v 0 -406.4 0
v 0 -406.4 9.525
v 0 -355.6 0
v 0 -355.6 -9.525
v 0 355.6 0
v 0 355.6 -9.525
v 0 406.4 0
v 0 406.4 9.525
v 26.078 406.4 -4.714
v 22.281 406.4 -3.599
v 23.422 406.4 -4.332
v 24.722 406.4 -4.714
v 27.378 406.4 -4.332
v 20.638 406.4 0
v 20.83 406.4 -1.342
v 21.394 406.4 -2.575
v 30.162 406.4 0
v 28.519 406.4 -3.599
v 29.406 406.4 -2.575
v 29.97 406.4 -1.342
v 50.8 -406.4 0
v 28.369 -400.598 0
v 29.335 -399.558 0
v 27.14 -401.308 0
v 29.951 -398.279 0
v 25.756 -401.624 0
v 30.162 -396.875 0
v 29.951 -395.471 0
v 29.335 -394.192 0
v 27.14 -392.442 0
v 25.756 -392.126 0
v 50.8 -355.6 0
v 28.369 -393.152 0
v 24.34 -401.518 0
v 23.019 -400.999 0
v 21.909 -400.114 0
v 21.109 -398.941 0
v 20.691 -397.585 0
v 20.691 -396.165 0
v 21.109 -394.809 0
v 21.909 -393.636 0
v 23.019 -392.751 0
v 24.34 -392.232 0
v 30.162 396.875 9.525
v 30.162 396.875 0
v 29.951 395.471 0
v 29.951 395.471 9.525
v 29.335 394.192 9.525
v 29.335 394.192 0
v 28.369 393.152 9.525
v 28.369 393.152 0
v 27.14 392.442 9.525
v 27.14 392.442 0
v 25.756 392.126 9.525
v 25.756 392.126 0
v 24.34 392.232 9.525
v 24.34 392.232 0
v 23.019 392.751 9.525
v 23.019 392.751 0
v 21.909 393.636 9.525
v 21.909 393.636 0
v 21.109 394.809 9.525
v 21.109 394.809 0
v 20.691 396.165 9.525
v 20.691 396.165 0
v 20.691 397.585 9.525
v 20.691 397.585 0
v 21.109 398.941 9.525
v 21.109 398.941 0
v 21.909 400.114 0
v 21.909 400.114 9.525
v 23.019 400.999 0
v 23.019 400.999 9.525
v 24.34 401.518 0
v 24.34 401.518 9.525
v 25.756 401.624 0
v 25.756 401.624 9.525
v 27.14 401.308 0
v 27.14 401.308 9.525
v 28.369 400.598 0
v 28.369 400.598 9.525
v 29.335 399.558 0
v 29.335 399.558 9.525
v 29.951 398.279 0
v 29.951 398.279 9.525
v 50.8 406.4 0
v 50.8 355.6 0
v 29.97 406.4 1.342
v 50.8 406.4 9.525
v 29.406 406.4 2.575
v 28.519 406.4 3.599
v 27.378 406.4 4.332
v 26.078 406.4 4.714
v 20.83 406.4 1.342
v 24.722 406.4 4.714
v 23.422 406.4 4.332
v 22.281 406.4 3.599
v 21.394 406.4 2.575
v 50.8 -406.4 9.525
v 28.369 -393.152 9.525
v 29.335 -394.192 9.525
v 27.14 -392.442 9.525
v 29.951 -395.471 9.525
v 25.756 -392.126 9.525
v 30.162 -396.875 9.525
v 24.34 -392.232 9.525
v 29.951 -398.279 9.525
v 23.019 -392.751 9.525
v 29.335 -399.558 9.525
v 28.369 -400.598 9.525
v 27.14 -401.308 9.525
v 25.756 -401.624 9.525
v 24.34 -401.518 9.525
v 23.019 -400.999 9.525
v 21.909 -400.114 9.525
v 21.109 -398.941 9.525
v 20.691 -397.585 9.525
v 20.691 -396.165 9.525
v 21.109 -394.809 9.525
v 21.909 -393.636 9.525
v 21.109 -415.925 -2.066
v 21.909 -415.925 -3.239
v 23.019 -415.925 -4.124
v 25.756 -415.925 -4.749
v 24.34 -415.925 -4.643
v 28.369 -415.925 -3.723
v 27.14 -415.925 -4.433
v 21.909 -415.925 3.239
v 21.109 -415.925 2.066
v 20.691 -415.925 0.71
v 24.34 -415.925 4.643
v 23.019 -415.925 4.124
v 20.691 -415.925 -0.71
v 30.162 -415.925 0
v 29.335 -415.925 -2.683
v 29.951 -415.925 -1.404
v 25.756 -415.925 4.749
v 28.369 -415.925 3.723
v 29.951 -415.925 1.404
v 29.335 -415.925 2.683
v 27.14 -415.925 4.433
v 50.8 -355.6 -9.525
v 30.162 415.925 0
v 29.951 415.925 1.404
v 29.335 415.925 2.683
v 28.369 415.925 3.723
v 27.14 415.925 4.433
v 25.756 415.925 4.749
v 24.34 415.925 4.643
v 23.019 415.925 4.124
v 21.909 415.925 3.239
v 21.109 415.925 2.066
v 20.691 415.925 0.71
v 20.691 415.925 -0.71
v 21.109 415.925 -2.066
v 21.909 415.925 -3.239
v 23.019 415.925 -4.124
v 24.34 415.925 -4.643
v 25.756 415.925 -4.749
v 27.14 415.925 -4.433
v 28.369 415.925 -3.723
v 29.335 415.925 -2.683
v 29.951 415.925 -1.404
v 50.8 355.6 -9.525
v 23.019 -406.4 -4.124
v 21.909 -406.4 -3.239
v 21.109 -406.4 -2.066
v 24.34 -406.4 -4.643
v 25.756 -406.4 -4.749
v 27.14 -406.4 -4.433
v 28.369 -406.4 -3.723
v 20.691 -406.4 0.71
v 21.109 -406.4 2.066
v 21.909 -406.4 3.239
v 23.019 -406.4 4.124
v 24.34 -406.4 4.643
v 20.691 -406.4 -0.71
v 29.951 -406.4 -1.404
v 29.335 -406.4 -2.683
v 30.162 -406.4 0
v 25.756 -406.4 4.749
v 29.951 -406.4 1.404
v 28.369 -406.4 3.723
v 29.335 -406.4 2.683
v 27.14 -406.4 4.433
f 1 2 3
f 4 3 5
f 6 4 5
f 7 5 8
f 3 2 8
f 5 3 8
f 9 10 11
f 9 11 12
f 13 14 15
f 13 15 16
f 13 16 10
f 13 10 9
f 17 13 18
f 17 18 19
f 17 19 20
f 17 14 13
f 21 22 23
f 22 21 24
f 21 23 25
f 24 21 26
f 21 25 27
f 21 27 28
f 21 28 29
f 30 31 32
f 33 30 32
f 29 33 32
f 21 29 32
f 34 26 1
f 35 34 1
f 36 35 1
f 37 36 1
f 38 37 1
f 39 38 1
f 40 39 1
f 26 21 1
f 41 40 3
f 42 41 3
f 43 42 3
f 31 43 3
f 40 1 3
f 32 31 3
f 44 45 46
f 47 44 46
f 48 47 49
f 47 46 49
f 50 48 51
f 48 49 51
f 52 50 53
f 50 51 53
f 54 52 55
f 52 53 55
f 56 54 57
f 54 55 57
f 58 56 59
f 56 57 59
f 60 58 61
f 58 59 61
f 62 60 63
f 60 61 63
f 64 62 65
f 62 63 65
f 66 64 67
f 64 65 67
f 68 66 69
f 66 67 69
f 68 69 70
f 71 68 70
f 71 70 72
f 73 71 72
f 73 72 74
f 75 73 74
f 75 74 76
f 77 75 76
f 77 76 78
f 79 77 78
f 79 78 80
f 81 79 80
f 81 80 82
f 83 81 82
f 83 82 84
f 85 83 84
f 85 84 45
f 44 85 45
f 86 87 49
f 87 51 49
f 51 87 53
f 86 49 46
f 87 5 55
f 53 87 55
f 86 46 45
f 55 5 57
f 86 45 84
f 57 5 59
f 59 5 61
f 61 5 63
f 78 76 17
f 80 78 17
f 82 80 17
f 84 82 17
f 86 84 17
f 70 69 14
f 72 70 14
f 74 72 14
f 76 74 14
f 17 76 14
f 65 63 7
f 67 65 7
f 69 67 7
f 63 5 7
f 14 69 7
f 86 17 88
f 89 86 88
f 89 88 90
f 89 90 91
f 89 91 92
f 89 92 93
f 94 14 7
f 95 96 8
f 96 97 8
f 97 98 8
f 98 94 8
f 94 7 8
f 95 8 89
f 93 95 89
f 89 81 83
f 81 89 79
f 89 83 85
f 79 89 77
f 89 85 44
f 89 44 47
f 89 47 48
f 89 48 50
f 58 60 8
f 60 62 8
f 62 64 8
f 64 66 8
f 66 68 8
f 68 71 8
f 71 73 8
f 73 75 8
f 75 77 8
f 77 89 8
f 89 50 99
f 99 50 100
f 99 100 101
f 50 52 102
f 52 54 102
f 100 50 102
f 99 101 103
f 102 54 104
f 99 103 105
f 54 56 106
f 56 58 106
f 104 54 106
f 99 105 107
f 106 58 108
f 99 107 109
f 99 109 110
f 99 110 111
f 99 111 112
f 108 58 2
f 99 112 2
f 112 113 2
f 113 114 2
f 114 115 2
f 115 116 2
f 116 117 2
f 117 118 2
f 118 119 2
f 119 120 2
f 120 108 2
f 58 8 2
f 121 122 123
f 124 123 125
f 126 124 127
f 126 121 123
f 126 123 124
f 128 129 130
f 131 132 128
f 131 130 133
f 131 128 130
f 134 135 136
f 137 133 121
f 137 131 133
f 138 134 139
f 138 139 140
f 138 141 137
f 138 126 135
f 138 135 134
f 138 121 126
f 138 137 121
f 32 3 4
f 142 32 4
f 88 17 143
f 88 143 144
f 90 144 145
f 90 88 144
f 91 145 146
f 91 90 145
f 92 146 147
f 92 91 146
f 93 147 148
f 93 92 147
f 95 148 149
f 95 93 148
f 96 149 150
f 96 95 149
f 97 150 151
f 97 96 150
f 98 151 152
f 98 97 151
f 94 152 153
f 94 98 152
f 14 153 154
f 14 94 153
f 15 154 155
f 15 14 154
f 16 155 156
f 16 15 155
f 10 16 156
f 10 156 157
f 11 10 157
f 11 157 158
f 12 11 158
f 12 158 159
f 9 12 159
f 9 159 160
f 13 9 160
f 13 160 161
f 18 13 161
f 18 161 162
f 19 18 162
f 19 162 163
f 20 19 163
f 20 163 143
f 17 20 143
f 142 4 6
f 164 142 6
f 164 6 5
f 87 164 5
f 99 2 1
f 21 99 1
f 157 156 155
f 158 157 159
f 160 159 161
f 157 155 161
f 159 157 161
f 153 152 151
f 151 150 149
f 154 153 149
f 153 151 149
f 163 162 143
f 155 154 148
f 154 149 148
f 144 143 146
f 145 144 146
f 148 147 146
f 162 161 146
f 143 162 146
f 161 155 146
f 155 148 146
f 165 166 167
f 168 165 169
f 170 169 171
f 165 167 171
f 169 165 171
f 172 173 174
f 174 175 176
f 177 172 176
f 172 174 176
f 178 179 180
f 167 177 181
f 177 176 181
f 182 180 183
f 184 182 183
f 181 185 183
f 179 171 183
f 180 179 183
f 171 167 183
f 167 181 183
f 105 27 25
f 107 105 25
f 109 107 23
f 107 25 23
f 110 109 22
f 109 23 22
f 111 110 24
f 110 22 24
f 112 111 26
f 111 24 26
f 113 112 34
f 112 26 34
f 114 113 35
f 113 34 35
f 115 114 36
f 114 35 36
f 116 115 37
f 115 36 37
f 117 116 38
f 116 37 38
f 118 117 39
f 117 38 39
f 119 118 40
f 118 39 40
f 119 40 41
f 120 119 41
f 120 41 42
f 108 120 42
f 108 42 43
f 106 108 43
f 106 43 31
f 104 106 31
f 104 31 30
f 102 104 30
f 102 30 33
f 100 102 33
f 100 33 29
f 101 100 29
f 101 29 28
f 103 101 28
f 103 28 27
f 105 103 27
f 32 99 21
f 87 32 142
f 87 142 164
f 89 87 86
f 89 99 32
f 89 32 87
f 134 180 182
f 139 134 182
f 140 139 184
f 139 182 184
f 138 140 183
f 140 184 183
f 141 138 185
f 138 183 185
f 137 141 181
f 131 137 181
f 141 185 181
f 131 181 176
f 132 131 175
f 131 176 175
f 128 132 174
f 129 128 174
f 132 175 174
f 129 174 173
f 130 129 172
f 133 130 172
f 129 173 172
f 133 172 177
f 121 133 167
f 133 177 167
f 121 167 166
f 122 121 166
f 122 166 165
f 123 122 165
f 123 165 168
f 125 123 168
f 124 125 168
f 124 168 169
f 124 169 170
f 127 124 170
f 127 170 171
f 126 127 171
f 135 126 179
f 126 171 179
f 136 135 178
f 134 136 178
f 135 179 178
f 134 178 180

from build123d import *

# Parameters (mm, degrees)
F1_DEPTH = 50.8
F2_R     = 4.7625
F3_DEPTH = 25.4
F6_R     = 4.7625
F8_DEPTH = 9.525
F7_R     = 4.7625
F9_DEPTH = 9.525


with BuildPart() as f1:
    # F0 (on Right) → F1 (new body)
    with BuildSketch(Plane.YZ):
        Polygon((-355.6, 0), (-355.6, -9.525), (355.6, -9.525), (355.6, 0), (406.4, 0), (406.4, 9.525), (-406.4, 9.525), (-406.4, 0), align=None)
    extrude(amount=F1_DEPTH)

    # F2 (on face) → F3 (cut)
    with BuildSketch(Plane(origin=(0, 0, -9.525), x_dir=(1, 0, 0), z_dir=(0, 0, -1))):
        with Locations((25.4, -396.875)):
            Circle(F2_R)
        with Locations((25.4, 396.875)):
            Circle(F2_R)
    extrude(amount=-F3_DEPTH, mode=Mode.SUBTRACT)

    # F7 (on offset) → F9 (join)
    with BuildSketch(Plane.XZ.offset(-406.4)):
        with Locations((25.4, 0)):
            Circle(F7_R)
    extrude(amount=-F9_DEPTH)


with BuildPart() as f8:
    # F6 (on offset) → F8 (new body)
    with BuildSketch(Plane.XZ.offset(406.4)):
        with Locations((25.4, 0)):
            Circle(F6_R)
    extrude(amount=F8_DEPTH)


solid = Compound([f1.part, f8.part])
